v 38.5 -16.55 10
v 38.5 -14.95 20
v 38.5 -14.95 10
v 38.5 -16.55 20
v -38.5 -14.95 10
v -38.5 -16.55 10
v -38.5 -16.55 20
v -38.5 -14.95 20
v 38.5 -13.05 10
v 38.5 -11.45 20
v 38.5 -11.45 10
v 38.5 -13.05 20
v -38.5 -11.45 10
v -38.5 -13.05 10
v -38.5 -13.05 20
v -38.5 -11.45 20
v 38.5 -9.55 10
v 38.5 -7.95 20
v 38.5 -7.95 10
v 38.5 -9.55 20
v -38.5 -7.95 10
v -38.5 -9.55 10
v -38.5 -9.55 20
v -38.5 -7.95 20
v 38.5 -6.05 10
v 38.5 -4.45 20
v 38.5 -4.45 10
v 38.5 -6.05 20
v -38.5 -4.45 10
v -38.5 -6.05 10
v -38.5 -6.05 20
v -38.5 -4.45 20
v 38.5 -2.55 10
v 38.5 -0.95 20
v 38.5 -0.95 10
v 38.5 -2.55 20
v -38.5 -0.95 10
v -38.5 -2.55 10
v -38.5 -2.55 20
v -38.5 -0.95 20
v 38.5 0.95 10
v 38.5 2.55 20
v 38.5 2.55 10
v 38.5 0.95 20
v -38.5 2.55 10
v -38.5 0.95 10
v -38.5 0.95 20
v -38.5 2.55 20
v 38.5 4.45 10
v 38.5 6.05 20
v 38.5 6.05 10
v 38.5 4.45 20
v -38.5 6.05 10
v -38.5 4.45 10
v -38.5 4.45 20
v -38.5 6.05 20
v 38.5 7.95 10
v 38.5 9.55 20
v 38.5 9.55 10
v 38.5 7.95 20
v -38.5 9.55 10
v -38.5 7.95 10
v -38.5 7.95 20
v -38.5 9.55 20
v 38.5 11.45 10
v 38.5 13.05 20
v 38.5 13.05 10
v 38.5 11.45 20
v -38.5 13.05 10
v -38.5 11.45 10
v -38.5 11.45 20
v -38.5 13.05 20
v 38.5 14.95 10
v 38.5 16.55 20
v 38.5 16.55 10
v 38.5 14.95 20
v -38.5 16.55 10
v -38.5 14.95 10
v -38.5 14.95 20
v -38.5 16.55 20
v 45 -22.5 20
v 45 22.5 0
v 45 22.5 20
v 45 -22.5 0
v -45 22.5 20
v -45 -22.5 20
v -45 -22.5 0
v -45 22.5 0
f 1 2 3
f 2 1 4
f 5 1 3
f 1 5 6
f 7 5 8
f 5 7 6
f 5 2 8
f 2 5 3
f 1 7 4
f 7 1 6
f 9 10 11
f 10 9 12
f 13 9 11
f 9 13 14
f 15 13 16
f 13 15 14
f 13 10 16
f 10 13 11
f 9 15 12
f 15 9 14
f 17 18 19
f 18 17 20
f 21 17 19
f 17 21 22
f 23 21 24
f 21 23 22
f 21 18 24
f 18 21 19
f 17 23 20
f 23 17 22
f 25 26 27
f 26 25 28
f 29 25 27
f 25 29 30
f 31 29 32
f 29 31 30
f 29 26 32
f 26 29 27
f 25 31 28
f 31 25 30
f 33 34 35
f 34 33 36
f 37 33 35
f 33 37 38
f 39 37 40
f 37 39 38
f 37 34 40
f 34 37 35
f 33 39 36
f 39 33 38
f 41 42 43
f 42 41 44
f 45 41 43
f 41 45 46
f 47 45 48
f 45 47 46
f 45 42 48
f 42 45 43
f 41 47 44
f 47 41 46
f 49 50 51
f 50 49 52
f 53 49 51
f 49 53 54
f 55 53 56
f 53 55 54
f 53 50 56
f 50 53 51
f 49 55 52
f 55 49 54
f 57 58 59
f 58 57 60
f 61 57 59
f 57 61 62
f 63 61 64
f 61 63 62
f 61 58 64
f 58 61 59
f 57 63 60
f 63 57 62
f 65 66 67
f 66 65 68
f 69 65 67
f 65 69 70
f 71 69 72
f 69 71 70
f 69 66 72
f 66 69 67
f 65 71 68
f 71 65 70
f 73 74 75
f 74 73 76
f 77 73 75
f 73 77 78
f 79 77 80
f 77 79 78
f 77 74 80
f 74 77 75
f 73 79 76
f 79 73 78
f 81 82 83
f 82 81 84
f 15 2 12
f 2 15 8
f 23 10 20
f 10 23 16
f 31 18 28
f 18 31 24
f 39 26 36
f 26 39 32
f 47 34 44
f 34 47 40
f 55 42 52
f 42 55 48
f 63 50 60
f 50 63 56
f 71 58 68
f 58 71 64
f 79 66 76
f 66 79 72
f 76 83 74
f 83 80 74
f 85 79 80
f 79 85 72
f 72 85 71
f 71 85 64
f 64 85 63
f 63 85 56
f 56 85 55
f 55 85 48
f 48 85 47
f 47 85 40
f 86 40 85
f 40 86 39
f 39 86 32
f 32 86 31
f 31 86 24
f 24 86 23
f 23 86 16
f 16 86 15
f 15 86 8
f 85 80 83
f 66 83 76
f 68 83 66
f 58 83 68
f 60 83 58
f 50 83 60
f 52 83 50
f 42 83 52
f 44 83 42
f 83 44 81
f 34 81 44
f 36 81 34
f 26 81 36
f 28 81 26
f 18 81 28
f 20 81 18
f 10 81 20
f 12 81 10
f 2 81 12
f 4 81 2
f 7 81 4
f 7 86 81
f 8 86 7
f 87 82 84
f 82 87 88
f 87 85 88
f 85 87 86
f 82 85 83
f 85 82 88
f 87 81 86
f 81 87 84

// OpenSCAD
// Microscope slide drying rack
// Print orientation: base block on XY plane, slots open upward (+Z)

// ---------- Parameters ----------
slide_len   = 75;    // slide length along X (mm)
slide_wid   = 25;    // slide width along Y (mm)
slide_thk   = 1;     // slide thickness along Z (mm)

base_len    = 90;    // block length along X (mm)
base_wid    = 45;    // block width along Y (mm)
base_ht     = 20;    // block height along Z (mm)

slot_count  = 10;    // number of slide slots
slot_len    = 77;    // slot length along X (mm)
slot_wid    = 1.6;   // slot width along Y (mm)
slot_depth  = 10;    // slot depth from top face (mm)
slot_pitch  = 3.5;   // centre-to-centre slot spacing in Y (mm)

eps         = 0.5;   // cutter overshoot past top face (mm)

$fn = 64;

// ---------- Model ----------
difference() {
    // Solid base block, centred in X/Y, resting on z = 0
    translate([-base_len/2, -base_wid/2, 0])
        cube([base_len, base_wid, base_ht]);

    // Parallel slots running along X, centred on the block
    for (i = [0 : slot_count - 1]) {
        y = (i - (slot_count - 1)/2) * slot_pitch;
        translate([-slot_len/2, y - slot_wid/2, base_ht - slot_depth])
            cube([slot_len, slot_wid, slot_depth + eps]);
    }
}
